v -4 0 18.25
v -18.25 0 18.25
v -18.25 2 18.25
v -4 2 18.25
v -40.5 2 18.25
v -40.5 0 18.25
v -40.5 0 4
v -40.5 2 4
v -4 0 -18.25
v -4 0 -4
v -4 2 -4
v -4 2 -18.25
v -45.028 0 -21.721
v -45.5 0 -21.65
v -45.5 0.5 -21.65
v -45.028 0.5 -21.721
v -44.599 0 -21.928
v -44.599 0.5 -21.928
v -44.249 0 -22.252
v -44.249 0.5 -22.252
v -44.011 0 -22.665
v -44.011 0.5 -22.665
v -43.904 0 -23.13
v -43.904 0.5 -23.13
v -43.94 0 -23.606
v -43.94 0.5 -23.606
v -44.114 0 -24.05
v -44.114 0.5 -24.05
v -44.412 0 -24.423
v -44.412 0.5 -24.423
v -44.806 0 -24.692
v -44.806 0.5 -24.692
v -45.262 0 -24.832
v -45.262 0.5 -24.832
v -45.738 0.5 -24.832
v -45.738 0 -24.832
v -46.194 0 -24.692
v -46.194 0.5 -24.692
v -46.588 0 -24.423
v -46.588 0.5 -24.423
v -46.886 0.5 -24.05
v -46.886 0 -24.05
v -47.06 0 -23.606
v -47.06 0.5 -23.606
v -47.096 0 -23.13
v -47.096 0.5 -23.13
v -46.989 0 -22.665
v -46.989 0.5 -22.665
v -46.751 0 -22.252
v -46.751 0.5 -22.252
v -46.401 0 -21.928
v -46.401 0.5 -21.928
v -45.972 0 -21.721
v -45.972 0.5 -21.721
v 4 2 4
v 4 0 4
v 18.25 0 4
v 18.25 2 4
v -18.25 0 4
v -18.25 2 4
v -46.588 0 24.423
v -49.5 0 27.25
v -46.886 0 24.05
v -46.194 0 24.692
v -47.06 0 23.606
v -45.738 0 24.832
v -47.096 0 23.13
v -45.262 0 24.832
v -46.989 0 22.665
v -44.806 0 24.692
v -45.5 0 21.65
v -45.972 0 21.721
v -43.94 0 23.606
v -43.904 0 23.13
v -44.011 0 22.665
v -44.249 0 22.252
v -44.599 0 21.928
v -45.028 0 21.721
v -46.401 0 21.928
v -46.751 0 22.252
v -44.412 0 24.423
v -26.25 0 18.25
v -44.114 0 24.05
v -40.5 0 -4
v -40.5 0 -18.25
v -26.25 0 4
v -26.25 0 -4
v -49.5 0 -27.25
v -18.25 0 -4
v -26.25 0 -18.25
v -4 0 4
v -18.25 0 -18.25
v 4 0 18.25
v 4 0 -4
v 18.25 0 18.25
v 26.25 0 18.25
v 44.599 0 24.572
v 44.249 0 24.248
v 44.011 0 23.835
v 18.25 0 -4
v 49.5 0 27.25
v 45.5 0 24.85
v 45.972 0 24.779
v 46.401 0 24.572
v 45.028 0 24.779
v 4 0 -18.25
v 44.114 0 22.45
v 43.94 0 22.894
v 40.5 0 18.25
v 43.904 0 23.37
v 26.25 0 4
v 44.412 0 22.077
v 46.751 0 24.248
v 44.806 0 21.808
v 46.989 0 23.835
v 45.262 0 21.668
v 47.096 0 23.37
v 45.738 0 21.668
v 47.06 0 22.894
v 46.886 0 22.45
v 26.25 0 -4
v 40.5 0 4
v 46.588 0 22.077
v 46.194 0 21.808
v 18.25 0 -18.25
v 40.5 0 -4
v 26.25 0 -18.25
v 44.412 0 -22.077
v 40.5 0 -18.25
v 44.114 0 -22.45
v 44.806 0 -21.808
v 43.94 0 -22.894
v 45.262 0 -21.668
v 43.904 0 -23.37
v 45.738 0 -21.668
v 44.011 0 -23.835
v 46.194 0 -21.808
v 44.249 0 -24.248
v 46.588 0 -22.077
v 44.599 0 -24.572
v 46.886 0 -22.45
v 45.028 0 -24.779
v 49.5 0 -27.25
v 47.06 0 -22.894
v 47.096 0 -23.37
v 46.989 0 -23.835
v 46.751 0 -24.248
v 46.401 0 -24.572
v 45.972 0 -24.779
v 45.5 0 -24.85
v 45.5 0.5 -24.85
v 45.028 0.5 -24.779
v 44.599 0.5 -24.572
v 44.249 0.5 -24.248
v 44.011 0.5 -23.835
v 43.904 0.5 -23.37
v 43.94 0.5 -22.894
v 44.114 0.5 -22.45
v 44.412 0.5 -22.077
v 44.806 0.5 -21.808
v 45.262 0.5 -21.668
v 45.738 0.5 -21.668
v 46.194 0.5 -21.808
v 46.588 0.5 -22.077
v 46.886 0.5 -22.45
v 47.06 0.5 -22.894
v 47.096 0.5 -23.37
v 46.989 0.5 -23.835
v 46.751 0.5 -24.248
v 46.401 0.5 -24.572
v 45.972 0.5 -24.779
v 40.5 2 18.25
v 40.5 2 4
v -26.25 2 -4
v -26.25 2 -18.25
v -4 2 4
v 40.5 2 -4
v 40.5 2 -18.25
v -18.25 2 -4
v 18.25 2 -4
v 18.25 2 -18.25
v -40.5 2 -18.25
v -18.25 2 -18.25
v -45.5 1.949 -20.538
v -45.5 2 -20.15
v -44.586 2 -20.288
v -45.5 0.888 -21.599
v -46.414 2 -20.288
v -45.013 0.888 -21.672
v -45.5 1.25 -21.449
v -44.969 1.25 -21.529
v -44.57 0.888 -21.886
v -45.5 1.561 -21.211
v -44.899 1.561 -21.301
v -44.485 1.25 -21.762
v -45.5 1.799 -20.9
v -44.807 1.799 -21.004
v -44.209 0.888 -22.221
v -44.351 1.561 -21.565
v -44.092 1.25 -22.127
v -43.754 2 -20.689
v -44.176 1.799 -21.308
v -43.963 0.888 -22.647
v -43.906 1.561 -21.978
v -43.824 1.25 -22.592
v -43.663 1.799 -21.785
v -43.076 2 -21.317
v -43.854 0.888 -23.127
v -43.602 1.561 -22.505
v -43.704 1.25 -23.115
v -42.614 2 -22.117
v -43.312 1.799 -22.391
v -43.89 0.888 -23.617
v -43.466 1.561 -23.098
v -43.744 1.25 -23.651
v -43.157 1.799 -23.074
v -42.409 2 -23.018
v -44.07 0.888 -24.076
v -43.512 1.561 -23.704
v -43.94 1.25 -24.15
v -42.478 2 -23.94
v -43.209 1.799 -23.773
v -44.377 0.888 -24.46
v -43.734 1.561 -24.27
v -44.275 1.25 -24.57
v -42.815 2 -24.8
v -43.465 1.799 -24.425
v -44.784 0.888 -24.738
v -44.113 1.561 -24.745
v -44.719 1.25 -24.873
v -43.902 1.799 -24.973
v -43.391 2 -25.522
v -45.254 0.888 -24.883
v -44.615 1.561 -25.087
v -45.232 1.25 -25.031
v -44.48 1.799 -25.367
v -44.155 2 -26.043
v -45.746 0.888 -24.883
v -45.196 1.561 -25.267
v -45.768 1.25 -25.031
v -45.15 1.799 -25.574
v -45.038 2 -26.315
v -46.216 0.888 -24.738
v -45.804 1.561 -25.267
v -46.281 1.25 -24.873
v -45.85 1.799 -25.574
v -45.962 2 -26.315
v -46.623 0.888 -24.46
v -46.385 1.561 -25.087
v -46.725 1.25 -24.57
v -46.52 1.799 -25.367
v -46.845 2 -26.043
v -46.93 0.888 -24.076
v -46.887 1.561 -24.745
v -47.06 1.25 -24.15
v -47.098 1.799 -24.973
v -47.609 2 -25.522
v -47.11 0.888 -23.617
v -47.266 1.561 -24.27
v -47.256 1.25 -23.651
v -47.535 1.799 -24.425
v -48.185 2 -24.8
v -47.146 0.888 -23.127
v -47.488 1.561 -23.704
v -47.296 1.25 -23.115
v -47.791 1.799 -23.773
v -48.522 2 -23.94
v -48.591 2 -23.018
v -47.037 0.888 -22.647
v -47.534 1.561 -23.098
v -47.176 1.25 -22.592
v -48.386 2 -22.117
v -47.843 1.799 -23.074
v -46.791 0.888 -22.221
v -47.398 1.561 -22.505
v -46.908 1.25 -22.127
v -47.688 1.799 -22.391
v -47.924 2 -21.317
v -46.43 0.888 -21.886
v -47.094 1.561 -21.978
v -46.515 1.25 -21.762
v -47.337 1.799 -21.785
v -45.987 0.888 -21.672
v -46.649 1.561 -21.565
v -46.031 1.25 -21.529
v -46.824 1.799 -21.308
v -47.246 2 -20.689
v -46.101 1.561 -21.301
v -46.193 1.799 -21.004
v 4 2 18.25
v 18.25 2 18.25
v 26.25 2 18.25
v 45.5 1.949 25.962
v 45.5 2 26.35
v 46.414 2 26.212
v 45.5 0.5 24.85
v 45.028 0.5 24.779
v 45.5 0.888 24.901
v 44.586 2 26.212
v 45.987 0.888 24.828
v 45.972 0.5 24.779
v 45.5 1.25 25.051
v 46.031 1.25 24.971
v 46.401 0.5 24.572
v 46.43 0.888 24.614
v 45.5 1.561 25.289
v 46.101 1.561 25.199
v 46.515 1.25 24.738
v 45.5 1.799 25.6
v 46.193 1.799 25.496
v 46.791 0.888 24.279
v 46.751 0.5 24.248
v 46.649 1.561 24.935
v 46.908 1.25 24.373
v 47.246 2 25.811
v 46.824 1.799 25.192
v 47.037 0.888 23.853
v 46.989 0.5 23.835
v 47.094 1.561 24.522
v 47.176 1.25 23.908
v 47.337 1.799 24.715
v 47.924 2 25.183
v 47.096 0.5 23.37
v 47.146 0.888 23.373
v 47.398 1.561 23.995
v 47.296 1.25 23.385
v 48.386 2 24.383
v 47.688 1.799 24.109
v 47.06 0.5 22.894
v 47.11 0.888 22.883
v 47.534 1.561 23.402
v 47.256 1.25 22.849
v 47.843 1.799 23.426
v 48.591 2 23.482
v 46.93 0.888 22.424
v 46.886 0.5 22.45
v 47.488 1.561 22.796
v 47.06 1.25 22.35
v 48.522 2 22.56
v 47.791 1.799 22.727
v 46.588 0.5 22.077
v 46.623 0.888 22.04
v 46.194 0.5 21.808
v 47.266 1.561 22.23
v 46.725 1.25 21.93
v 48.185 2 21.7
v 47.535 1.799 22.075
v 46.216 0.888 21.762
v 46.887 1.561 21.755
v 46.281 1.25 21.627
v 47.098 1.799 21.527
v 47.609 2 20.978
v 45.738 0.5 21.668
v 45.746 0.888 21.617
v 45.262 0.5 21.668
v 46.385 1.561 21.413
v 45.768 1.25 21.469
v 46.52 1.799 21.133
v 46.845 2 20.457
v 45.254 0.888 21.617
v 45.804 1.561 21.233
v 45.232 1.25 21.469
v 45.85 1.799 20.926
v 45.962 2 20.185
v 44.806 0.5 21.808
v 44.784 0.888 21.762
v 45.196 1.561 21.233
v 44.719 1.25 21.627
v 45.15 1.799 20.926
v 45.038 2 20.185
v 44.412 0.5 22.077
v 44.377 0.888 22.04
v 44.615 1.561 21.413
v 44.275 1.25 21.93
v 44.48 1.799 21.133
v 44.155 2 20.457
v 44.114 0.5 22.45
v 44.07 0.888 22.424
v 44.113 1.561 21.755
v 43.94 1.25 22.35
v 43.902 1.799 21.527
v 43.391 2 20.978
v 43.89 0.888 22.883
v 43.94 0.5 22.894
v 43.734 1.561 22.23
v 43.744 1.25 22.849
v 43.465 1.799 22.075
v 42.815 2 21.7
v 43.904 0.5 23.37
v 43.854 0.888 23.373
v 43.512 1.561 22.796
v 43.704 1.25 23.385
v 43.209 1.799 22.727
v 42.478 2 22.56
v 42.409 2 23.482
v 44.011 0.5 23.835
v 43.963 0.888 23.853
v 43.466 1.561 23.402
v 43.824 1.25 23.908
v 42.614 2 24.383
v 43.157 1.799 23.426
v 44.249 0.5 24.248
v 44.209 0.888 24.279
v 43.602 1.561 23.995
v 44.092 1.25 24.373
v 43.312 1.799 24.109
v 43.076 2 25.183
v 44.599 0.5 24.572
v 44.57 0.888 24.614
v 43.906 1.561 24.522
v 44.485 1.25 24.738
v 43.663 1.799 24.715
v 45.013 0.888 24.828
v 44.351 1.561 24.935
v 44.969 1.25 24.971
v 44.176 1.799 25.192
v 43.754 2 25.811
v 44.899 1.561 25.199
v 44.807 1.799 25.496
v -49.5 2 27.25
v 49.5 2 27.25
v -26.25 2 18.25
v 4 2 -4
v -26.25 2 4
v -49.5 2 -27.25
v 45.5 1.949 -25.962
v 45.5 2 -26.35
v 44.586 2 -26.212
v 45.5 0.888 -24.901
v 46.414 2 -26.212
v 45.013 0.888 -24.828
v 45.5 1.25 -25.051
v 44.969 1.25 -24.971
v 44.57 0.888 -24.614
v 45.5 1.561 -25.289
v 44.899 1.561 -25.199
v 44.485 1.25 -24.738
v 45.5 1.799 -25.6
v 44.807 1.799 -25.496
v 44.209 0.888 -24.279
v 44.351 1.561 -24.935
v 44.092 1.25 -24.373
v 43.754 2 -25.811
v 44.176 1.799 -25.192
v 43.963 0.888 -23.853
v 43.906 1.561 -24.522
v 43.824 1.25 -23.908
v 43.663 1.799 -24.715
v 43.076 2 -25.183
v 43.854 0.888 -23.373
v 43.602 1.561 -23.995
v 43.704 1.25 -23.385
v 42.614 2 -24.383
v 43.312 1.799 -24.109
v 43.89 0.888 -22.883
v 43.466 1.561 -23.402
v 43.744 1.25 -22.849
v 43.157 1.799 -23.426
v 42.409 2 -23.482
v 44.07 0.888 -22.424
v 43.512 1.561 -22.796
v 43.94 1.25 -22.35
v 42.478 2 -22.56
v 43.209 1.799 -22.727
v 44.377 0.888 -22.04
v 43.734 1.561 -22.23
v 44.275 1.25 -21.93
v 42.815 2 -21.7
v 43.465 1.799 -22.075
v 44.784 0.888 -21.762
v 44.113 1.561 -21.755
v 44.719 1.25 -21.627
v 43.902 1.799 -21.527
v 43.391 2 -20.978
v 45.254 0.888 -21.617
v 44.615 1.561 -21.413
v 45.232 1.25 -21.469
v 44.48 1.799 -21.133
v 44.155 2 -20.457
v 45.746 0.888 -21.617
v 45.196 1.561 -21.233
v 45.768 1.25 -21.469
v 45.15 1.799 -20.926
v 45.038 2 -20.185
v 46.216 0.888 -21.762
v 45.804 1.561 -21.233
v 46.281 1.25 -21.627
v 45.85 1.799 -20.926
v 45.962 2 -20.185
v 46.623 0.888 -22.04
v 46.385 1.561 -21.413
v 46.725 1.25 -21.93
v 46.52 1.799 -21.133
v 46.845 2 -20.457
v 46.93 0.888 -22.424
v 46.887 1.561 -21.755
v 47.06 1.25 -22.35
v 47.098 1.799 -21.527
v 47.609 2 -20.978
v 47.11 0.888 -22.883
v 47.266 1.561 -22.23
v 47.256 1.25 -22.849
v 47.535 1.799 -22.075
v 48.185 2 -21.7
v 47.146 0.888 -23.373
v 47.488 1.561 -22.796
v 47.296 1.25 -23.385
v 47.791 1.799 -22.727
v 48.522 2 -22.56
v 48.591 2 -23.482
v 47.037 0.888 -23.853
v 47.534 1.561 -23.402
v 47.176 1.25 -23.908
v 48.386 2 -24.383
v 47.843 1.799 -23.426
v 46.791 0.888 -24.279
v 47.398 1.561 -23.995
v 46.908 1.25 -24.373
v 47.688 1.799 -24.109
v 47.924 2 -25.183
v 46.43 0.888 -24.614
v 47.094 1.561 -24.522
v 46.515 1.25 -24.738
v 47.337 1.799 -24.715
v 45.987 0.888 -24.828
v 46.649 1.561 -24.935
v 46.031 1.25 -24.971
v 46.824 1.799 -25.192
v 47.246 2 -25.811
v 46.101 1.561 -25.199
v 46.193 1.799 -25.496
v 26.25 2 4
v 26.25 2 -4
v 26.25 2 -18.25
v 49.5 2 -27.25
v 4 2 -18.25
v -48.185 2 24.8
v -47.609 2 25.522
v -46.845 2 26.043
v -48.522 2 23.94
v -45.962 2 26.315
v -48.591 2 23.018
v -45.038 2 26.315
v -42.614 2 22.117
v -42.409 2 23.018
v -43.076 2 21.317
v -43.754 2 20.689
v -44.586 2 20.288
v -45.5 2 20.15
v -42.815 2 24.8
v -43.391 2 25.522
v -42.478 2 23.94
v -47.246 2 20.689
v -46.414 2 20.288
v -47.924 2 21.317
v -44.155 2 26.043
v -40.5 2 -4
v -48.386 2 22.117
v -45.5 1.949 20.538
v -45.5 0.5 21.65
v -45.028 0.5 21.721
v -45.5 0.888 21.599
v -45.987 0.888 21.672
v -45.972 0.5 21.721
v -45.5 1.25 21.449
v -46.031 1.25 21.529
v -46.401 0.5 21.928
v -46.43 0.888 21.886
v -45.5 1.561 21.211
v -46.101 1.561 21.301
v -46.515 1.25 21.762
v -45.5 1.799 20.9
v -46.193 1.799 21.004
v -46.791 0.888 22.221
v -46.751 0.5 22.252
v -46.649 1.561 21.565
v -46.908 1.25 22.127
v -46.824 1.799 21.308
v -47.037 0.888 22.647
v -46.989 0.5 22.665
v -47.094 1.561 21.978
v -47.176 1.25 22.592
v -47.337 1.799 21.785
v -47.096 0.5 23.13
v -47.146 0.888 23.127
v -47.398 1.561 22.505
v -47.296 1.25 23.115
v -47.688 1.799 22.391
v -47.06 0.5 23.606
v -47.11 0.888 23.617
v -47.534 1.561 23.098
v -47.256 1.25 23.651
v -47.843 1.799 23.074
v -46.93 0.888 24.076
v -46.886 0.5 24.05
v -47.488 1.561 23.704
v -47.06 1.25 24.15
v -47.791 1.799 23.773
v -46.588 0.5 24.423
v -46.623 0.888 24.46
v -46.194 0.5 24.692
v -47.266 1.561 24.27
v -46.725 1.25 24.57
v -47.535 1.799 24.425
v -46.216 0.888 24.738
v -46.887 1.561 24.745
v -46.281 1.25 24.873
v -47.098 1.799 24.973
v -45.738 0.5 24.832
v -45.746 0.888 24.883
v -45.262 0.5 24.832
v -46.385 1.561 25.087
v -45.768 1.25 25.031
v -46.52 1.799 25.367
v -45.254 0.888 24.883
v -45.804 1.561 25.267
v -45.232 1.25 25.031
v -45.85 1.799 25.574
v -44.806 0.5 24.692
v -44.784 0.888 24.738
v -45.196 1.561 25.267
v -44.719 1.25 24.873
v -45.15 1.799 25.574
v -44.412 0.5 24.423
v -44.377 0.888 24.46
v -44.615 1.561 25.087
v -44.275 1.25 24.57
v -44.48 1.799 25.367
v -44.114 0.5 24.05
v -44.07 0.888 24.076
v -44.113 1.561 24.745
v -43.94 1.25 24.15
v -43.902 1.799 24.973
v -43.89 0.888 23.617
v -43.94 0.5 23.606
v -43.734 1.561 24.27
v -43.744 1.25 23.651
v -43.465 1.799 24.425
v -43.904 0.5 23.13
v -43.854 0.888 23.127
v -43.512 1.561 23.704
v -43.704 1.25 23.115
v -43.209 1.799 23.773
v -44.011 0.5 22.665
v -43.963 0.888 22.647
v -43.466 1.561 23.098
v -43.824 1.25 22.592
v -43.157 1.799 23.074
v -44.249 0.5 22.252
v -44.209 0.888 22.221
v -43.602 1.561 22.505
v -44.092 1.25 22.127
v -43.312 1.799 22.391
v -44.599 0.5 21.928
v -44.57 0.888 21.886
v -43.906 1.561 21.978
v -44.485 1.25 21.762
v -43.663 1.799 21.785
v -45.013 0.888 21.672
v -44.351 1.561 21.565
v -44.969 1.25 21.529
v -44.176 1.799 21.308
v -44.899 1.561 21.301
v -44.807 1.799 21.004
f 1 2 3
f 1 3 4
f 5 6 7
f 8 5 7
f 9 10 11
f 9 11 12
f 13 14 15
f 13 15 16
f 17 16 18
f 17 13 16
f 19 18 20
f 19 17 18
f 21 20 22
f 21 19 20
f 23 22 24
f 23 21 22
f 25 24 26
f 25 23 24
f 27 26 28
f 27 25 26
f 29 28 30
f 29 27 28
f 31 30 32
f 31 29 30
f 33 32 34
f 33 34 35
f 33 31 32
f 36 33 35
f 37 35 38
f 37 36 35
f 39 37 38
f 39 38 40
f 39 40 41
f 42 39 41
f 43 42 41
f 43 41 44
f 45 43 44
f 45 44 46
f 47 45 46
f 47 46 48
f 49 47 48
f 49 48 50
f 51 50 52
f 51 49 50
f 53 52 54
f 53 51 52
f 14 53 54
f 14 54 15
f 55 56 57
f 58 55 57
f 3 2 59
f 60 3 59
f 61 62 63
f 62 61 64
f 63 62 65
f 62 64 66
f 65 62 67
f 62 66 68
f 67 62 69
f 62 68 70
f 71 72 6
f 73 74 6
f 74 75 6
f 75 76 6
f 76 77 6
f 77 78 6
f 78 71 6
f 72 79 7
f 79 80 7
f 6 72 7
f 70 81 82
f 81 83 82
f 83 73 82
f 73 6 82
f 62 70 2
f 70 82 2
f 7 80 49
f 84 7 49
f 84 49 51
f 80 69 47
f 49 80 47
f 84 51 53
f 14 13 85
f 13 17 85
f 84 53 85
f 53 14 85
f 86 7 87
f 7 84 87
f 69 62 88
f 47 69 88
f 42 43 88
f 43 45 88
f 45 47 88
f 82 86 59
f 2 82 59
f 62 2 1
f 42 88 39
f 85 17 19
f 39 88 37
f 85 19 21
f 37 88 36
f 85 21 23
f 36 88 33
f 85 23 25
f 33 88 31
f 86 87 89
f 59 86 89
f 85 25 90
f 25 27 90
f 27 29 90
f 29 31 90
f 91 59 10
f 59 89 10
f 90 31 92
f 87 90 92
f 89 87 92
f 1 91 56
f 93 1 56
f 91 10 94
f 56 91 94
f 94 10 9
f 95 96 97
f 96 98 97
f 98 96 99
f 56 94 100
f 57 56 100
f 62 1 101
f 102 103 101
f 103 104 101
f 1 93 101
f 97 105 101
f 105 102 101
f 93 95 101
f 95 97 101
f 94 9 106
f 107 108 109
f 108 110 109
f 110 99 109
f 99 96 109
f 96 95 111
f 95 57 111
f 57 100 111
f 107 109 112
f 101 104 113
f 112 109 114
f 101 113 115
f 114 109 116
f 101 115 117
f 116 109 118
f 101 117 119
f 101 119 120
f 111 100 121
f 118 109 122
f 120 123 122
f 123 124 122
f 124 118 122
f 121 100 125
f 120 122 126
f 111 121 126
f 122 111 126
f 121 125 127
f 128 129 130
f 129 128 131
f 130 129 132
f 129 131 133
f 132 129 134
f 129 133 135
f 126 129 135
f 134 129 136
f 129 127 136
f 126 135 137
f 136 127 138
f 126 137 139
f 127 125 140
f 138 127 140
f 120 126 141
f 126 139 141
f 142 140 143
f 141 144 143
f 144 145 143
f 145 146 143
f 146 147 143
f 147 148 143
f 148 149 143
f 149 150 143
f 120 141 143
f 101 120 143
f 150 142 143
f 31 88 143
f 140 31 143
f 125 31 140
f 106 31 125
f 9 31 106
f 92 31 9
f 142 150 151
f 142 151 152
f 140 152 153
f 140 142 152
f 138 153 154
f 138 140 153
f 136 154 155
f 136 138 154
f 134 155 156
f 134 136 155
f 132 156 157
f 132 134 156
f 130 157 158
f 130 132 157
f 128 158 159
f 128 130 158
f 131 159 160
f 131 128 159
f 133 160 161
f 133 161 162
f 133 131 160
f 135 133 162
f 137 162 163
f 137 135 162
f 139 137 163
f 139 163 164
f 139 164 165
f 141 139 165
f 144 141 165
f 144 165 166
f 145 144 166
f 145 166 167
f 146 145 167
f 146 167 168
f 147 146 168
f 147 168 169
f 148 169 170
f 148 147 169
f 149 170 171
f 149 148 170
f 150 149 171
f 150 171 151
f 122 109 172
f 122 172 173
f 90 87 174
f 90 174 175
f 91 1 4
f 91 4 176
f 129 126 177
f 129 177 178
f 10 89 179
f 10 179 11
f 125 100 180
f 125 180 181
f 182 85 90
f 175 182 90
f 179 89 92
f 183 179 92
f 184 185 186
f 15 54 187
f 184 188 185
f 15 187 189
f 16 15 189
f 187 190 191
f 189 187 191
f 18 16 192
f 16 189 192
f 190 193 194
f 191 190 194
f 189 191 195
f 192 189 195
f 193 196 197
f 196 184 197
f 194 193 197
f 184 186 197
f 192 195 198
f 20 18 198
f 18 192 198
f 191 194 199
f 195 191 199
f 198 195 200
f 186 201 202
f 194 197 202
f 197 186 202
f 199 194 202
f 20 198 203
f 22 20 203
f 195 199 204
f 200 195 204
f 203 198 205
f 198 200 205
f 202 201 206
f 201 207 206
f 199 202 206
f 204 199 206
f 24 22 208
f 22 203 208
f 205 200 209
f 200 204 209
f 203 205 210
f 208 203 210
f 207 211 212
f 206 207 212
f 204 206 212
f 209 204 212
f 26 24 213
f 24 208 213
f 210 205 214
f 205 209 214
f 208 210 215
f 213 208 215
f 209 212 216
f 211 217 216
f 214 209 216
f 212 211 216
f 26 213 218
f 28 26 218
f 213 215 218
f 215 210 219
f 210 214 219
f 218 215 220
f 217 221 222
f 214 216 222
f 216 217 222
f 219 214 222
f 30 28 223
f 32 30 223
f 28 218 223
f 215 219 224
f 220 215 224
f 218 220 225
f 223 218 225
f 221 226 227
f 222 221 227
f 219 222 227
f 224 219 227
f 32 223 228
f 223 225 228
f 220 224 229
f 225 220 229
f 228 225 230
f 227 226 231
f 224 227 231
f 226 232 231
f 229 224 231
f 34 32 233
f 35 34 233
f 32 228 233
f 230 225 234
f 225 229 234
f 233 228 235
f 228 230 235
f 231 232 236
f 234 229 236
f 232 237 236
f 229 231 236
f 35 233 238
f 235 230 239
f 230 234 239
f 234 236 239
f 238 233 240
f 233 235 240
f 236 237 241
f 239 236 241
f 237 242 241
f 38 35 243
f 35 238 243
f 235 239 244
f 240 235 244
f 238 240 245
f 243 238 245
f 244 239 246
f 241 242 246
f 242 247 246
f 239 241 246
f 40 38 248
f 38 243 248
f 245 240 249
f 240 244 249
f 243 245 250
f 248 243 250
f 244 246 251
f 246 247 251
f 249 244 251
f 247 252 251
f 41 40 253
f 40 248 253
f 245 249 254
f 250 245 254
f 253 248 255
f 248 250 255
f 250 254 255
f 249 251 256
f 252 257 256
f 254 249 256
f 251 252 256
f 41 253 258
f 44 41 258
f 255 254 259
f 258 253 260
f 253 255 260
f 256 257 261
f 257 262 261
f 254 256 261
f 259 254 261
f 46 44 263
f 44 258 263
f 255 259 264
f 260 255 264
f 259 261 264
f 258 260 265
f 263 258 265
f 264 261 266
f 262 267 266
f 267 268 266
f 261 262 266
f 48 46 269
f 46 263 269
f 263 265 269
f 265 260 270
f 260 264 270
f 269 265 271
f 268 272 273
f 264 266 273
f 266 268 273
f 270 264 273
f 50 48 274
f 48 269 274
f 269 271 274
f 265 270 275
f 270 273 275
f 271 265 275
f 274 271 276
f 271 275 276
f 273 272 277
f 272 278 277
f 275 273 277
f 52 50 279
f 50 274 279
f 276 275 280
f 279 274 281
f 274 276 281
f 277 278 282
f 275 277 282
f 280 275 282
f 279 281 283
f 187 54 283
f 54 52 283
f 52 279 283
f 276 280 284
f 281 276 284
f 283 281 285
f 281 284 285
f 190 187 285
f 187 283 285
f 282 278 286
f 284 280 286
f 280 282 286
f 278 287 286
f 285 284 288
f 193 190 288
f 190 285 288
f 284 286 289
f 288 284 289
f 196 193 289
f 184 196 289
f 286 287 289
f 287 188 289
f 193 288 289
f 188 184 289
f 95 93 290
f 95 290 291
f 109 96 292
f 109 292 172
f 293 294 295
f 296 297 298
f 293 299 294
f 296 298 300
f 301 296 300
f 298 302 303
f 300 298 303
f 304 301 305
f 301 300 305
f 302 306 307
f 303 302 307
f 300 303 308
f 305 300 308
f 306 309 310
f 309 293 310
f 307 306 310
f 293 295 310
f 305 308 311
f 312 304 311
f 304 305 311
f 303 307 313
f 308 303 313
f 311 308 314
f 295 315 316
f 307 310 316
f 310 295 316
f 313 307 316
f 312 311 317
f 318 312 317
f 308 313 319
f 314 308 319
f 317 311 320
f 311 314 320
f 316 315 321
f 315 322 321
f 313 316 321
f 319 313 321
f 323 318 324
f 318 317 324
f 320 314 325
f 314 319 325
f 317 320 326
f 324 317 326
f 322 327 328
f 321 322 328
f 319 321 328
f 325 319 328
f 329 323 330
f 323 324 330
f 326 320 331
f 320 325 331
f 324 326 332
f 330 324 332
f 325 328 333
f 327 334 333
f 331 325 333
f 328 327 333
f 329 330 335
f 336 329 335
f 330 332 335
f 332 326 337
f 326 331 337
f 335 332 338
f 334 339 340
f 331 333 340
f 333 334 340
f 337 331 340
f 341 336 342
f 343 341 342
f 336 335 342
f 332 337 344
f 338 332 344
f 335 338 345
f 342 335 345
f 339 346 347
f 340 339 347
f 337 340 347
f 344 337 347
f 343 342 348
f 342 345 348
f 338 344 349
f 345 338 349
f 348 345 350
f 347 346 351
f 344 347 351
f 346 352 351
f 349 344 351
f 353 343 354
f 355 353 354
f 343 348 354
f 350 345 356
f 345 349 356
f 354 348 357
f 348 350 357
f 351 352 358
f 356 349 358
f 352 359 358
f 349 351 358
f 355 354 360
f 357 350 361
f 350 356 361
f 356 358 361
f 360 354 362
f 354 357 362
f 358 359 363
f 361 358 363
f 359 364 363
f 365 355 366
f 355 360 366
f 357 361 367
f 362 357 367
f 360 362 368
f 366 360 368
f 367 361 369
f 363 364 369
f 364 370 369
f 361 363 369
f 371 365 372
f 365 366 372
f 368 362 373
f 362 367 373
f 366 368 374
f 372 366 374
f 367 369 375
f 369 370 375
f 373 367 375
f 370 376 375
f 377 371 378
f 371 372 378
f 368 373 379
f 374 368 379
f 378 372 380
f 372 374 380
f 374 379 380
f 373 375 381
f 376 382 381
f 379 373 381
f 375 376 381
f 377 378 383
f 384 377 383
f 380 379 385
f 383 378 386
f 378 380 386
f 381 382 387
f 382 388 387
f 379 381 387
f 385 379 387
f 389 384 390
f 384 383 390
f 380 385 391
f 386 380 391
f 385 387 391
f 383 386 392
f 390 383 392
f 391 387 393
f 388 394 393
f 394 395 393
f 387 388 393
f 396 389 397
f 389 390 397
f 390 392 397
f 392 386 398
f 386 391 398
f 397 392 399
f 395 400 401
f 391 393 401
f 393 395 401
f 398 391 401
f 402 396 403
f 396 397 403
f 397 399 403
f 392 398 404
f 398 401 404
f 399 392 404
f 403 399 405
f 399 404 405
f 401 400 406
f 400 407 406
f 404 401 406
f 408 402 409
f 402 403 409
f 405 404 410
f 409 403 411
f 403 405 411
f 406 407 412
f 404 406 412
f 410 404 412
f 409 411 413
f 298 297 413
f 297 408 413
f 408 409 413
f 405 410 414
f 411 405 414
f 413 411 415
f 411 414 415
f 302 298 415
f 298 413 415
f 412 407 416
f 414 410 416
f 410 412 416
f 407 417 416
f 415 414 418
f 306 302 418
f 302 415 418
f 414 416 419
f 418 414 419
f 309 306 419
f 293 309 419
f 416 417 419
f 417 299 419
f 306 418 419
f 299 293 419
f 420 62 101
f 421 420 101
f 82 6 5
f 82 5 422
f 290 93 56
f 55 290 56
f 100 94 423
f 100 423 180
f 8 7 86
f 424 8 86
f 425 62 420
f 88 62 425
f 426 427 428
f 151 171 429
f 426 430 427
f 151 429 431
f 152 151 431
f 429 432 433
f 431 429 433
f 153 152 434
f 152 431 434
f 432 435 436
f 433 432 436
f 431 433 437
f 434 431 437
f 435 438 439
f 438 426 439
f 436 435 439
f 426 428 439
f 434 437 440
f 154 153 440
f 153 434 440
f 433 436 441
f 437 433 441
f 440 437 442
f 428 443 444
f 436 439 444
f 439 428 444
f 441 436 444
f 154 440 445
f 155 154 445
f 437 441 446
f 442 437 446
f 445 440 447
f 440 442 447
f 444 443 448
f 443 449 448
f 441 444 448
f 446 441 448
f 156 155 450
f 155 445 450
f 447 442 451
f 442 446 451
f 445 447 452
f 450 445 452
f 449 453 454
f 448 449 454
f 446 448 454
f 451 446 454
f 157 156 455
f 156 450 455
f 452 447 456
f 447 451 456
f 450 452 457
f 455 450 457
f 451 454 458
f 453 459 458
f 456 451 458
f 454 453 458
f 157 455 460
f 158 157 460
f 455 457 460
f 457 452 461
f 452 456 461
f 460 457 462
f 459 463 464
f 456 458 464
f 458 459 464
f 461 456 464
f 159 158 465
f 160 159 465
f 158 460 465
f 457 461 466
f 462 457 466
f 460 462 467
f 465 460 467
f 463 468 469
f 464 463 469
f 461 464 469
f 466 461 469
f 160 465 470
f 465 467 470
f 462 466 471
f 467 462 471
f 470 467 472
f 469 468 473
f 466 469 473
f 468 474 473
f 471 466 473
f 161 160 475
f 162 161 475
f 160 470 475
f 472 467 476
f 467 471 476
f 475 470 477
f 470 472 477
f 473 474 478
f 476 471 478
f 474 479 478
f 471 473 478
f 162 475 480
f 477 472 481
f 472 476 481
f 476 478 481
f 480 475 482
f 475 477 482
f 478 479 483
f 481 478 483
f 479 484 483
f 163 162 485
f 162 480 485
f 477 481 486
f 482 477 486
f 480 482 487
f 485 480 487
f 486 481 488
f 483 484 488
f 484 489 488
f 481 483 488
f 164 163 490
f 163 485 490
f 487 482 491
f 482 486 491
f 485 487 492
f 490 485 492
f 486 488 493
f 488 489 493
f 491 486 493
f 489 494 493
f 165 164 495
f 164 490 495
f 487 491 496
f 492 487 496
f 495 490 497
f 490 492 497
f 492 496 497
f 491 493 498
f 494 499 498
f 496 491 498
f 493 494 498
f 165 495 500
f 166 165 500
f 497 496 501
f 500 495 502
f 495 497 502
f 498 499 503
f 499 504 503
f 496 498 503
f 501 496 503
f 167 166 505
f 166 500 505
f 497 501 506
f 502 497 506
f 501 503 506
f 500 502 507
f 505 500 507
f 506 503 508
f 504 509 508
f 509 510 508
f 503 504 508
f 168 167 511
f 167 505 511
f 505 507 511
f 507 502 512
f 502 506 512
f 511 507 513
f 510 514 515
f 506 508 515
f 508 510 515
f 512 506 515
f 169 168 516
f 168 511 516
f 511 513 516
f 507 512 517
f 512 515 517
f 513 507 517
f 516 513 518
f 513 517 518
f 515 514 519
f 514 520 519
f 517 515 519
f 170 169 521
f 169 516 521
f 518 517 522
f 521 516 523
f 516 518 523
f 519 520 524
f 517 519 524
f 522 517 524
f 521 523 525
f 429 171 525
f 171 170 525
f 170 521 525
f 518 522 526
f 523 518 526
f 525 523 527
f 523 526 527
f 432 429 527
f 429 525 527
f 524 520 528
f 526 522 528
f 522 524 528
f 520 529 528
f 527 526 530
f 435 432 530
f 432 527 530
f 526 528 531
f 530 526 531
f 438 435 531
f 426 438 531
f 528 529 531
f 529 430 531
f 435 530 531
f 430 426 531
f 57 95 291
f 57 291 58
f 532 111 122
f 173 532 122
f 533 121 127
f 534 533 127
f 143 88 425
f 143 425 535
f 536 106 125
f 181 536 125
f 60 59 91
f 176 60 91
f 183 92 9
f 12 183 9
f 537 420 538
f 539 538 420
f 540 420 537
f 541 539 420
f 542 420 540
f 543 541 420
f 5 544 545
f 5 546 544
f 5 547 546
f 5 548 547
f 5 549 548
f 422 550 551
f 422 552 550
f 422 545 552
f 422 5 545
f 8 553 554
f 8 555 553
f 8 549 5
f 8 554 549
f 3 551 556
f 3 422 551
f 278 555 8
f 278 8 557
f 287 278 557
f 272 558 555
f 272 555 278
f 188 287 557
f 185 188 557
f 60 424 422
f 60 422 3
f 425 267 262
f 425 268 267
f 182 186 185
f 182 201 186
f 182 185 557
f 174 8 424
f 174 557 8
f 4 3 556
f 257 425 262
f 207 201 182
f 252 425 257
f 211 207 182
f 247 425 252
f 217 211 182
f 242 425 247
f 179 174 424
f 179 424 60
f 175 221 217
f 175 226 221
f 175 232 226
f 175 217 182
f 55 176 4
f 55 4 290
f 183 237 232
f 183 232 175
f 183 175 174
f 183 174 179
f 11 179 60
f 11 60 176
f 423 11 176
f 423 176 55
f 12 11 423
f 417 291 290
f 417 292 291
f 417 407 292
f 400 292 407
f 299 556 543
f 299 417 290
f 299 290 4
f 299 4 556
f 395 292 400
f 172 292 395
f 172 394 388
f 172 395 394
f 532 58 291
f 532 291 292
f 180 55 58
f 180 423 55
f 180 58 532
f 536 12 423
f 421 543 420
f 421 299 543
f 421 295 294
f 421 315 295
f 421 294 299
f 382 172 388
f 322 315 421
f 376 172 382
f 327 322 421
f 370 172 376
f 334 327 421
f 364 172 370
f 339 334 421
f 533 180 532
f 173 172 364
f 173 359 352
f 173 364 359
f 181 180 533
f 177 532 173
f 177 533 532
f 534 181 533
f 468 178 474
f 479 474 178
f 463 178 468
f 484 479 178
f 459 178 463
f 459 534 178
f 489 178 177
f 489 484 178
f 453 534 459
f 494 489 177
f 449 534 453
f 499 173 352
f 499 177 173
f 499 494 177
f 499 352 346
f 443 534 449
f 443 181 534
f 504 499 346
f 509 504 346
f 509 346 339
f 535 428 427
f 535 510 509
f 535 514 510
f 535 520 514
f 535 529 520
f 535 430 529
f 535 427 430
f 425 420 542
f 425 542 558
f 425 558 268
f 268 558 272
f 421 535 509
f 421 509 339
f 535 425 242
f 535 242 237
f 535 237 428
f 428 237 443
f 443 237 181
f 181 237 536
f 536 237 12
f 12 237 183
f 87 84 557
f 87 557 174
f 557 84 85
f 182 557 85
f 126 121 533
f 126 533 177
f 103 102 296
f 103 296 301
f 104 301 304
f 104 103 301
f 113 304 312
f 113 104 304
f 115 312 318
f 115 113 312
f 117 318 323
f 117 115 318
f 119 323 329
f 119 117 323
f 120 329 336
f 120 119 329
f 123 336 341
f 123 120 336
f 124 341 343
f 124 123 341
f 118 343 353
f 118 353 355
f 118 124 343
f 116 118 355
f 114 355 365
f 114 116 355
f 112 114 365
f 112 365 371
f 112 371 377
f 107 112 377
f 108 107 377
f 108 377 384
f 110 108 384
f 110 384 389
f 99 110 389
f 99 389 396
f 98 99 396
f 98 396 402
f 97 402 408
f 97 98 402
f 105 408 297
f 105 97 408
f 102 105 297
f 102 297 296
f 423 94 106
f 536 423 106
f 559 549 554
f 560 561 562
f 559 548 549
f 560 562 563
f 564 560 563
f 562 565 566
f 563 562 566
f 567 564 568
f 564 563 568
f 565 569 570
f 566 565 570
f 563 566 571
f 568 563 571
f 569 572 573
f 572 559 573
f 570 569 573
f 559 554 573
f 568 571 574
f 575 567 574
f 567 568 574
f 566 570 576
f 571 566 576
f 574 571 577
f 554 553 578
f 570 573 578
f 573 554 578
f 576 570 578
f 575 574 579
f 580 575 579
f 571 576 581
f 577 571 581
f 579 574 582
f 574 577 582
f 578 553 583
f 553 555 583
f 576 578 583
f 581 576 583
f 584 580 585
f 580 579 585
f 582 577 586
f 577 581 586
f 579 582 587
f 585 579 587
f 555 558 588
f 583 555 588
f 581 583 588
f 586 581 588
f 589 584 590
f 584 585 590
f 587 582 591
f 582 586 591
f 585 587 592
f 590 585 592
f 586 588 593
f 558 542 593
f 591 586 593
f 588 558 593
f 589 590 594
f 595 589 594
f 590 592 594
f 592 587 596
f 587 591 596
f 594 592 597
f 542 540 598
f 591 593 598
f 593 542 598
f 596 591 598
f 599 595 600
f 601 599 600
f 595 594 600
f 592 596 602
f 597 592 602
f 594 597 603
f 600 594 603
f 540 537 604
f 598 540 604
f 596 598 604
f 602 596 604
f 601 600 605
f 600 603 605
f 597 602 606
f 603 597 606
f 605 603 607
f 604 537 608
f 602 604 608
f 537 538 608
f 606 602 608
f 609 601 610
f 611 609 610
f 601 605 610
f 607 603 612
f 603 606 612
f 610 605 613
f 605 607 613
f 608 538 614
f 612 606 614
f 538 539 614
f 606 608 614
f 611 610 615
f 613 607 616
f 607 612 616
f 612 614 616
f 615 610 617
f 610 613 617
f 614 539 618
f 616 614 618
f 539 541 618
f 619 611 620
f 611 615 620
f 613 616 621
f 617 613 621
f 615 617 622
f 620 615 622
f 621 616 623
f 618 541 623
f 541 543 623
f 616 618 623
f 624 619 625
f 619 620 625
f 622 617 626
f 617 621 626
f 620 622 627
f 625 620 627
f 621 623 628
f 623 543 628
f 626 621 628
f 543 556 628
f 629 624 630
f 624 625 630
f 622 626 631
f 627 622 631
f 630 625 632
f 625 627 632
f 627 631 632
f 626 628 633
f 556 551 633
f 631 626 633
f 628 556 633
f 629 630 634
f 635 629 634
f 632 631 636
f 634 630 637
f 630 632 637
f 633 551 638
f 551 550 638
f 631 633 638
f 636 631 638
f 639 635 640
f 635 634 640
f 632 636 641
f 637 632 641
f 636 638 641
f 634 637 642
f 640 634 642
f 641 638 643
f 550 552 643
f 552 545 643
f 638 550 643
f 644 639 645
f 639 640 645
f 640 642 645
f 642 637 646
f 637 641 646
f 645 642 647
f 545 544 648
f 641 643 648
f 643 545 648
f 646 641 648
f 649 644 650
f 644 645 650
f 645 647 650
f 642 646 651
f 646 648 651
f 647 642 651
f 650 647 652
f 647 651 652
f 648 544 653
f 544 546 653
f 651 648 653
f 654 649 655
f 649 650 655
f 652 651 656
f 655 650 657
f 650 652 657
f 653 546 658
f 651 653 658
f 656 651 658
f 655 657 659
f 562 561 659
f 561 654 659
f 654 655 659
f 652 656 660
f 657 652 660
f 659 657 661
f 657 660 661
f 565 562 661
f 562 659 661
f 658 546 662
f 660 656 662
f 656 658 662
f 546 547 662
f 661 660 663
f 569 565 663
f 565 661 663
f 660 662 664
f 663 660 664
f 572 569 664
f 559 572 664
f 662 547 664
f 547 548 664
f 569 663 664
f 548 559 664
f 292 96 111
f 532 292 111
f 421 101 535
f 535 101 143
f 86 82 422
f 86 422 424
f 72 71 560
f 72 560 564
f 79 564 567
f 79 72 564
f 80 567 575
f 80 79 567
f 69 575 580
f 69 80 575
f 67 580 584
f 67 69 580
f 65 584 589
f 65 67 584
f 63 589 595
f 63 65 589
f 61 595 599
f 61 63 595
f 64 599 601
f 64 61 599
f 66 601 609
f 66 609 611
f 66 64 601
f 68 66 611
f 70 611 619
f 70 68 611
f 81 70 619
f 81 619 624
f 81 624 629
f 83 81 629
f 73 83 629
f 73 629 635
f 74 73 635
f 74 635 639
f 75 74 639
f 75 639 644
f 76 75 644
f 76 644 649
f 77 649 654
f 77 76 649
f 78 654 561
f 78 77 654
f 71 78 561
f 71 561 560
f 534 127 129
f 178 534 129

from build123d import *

# Parameters (mm, degrees)
SKETCH1_W           = 99
SKETCH1_H           = 54.5
SKETCH1_R           = 1.6
SKETCH1_W_2         = 14.25
SKETCH1_H_2         = 14.25
BOSS_EXTRUDE1_DEPTH = 2
FILLET1_R           = 1.5


with BuildPart() as part:
    # Sketch1 → Boss-Extrude1 (new body)
    with BuildSketch(Plane(origin=(0, 0, 0), x_dir=(1, 0, 0), z_dir=(0, 1, 0))):
        Rectangle(SKETCH1_W, SKETCH1_H)
        with Locations(Location((-45.5, 23.25, 0), (0, 0, 270))):
            Circle(SKETCH1_R, mode=Mode.SUBTRACT)
        with Locations(Location((45.5, 23.25, 0), (0, 0, 90))):
            Circle(SKETCH1_R, mode=Mode.SUBTRACT)
        with Locations(Location((45.5, -23.25, 0), (0, 0, 270))):
            Circle(SKETCH1_R, mode=Mode.SUBTRACT)
        with Locations(Location((-45.5, -23.25, 0), (0, 0, 90))):
            Circle(SKETCH1_R, mode=Mode.SUBTRACT)
        with Locations((-33.375, 11.125)):
            Rectangle(SKETCH1_W_2, SKETCH1_H_2, mode=Mode.SUBTRACT)
        with Locations((-11.125, 11.125)):
            Rectangle(SKETCH1_W_2, SKETCH1_H_2, mode=Mode.SUBTRACT)
        with Locations((11.125, 11.125)):
            Rectangle(SKETCH1_W_2, SKETCH1_H_2, mode=Mode.SUBTRACT)
        with Locations((33.375, 11.125)):
            Rectangle(SKETCH1_W_2, SKETCH1_H_2, mode=Mode.SUBTRACT)
        with Locations((33.375, -11.125)):
            Rectangle(SKETCH1_W_2, SKETCH1_H_2, mode=Mode.SUBTRACT)
        with Locations((11.125, -11.125)):
            Rectangle(SKETCH1_W_2, SKETCH1_H_2, mode=Mode.SUBTRACT)
        with Locations((-11.125, -11.125)):
            Rectangle(SKETCH1_W_2, SKETCH1_H_2, mode=Mode.SUBTRACT)
        with Locations((-33.375, -11.125)):
            Rectangle(SKETCH1_W_2, SKETCH1_H_2, mode=Mode.SUBTRACT)
    extrude(amount=BOSS_EXTRUDE1_DEPTH)

    # Fillet1
    fillet1_edges = [part.edges().sort_by_distance(p)[0] for p in [
        (-45.5, 2, -24.85),
        (45.5, 2, -21.65),
        (45.5, 2, 21.65),
        (-45.5, 2, 24.85),
    ]]
    fillet(fillet1_edges, radius=FILLET1_R)


solid = part.part
